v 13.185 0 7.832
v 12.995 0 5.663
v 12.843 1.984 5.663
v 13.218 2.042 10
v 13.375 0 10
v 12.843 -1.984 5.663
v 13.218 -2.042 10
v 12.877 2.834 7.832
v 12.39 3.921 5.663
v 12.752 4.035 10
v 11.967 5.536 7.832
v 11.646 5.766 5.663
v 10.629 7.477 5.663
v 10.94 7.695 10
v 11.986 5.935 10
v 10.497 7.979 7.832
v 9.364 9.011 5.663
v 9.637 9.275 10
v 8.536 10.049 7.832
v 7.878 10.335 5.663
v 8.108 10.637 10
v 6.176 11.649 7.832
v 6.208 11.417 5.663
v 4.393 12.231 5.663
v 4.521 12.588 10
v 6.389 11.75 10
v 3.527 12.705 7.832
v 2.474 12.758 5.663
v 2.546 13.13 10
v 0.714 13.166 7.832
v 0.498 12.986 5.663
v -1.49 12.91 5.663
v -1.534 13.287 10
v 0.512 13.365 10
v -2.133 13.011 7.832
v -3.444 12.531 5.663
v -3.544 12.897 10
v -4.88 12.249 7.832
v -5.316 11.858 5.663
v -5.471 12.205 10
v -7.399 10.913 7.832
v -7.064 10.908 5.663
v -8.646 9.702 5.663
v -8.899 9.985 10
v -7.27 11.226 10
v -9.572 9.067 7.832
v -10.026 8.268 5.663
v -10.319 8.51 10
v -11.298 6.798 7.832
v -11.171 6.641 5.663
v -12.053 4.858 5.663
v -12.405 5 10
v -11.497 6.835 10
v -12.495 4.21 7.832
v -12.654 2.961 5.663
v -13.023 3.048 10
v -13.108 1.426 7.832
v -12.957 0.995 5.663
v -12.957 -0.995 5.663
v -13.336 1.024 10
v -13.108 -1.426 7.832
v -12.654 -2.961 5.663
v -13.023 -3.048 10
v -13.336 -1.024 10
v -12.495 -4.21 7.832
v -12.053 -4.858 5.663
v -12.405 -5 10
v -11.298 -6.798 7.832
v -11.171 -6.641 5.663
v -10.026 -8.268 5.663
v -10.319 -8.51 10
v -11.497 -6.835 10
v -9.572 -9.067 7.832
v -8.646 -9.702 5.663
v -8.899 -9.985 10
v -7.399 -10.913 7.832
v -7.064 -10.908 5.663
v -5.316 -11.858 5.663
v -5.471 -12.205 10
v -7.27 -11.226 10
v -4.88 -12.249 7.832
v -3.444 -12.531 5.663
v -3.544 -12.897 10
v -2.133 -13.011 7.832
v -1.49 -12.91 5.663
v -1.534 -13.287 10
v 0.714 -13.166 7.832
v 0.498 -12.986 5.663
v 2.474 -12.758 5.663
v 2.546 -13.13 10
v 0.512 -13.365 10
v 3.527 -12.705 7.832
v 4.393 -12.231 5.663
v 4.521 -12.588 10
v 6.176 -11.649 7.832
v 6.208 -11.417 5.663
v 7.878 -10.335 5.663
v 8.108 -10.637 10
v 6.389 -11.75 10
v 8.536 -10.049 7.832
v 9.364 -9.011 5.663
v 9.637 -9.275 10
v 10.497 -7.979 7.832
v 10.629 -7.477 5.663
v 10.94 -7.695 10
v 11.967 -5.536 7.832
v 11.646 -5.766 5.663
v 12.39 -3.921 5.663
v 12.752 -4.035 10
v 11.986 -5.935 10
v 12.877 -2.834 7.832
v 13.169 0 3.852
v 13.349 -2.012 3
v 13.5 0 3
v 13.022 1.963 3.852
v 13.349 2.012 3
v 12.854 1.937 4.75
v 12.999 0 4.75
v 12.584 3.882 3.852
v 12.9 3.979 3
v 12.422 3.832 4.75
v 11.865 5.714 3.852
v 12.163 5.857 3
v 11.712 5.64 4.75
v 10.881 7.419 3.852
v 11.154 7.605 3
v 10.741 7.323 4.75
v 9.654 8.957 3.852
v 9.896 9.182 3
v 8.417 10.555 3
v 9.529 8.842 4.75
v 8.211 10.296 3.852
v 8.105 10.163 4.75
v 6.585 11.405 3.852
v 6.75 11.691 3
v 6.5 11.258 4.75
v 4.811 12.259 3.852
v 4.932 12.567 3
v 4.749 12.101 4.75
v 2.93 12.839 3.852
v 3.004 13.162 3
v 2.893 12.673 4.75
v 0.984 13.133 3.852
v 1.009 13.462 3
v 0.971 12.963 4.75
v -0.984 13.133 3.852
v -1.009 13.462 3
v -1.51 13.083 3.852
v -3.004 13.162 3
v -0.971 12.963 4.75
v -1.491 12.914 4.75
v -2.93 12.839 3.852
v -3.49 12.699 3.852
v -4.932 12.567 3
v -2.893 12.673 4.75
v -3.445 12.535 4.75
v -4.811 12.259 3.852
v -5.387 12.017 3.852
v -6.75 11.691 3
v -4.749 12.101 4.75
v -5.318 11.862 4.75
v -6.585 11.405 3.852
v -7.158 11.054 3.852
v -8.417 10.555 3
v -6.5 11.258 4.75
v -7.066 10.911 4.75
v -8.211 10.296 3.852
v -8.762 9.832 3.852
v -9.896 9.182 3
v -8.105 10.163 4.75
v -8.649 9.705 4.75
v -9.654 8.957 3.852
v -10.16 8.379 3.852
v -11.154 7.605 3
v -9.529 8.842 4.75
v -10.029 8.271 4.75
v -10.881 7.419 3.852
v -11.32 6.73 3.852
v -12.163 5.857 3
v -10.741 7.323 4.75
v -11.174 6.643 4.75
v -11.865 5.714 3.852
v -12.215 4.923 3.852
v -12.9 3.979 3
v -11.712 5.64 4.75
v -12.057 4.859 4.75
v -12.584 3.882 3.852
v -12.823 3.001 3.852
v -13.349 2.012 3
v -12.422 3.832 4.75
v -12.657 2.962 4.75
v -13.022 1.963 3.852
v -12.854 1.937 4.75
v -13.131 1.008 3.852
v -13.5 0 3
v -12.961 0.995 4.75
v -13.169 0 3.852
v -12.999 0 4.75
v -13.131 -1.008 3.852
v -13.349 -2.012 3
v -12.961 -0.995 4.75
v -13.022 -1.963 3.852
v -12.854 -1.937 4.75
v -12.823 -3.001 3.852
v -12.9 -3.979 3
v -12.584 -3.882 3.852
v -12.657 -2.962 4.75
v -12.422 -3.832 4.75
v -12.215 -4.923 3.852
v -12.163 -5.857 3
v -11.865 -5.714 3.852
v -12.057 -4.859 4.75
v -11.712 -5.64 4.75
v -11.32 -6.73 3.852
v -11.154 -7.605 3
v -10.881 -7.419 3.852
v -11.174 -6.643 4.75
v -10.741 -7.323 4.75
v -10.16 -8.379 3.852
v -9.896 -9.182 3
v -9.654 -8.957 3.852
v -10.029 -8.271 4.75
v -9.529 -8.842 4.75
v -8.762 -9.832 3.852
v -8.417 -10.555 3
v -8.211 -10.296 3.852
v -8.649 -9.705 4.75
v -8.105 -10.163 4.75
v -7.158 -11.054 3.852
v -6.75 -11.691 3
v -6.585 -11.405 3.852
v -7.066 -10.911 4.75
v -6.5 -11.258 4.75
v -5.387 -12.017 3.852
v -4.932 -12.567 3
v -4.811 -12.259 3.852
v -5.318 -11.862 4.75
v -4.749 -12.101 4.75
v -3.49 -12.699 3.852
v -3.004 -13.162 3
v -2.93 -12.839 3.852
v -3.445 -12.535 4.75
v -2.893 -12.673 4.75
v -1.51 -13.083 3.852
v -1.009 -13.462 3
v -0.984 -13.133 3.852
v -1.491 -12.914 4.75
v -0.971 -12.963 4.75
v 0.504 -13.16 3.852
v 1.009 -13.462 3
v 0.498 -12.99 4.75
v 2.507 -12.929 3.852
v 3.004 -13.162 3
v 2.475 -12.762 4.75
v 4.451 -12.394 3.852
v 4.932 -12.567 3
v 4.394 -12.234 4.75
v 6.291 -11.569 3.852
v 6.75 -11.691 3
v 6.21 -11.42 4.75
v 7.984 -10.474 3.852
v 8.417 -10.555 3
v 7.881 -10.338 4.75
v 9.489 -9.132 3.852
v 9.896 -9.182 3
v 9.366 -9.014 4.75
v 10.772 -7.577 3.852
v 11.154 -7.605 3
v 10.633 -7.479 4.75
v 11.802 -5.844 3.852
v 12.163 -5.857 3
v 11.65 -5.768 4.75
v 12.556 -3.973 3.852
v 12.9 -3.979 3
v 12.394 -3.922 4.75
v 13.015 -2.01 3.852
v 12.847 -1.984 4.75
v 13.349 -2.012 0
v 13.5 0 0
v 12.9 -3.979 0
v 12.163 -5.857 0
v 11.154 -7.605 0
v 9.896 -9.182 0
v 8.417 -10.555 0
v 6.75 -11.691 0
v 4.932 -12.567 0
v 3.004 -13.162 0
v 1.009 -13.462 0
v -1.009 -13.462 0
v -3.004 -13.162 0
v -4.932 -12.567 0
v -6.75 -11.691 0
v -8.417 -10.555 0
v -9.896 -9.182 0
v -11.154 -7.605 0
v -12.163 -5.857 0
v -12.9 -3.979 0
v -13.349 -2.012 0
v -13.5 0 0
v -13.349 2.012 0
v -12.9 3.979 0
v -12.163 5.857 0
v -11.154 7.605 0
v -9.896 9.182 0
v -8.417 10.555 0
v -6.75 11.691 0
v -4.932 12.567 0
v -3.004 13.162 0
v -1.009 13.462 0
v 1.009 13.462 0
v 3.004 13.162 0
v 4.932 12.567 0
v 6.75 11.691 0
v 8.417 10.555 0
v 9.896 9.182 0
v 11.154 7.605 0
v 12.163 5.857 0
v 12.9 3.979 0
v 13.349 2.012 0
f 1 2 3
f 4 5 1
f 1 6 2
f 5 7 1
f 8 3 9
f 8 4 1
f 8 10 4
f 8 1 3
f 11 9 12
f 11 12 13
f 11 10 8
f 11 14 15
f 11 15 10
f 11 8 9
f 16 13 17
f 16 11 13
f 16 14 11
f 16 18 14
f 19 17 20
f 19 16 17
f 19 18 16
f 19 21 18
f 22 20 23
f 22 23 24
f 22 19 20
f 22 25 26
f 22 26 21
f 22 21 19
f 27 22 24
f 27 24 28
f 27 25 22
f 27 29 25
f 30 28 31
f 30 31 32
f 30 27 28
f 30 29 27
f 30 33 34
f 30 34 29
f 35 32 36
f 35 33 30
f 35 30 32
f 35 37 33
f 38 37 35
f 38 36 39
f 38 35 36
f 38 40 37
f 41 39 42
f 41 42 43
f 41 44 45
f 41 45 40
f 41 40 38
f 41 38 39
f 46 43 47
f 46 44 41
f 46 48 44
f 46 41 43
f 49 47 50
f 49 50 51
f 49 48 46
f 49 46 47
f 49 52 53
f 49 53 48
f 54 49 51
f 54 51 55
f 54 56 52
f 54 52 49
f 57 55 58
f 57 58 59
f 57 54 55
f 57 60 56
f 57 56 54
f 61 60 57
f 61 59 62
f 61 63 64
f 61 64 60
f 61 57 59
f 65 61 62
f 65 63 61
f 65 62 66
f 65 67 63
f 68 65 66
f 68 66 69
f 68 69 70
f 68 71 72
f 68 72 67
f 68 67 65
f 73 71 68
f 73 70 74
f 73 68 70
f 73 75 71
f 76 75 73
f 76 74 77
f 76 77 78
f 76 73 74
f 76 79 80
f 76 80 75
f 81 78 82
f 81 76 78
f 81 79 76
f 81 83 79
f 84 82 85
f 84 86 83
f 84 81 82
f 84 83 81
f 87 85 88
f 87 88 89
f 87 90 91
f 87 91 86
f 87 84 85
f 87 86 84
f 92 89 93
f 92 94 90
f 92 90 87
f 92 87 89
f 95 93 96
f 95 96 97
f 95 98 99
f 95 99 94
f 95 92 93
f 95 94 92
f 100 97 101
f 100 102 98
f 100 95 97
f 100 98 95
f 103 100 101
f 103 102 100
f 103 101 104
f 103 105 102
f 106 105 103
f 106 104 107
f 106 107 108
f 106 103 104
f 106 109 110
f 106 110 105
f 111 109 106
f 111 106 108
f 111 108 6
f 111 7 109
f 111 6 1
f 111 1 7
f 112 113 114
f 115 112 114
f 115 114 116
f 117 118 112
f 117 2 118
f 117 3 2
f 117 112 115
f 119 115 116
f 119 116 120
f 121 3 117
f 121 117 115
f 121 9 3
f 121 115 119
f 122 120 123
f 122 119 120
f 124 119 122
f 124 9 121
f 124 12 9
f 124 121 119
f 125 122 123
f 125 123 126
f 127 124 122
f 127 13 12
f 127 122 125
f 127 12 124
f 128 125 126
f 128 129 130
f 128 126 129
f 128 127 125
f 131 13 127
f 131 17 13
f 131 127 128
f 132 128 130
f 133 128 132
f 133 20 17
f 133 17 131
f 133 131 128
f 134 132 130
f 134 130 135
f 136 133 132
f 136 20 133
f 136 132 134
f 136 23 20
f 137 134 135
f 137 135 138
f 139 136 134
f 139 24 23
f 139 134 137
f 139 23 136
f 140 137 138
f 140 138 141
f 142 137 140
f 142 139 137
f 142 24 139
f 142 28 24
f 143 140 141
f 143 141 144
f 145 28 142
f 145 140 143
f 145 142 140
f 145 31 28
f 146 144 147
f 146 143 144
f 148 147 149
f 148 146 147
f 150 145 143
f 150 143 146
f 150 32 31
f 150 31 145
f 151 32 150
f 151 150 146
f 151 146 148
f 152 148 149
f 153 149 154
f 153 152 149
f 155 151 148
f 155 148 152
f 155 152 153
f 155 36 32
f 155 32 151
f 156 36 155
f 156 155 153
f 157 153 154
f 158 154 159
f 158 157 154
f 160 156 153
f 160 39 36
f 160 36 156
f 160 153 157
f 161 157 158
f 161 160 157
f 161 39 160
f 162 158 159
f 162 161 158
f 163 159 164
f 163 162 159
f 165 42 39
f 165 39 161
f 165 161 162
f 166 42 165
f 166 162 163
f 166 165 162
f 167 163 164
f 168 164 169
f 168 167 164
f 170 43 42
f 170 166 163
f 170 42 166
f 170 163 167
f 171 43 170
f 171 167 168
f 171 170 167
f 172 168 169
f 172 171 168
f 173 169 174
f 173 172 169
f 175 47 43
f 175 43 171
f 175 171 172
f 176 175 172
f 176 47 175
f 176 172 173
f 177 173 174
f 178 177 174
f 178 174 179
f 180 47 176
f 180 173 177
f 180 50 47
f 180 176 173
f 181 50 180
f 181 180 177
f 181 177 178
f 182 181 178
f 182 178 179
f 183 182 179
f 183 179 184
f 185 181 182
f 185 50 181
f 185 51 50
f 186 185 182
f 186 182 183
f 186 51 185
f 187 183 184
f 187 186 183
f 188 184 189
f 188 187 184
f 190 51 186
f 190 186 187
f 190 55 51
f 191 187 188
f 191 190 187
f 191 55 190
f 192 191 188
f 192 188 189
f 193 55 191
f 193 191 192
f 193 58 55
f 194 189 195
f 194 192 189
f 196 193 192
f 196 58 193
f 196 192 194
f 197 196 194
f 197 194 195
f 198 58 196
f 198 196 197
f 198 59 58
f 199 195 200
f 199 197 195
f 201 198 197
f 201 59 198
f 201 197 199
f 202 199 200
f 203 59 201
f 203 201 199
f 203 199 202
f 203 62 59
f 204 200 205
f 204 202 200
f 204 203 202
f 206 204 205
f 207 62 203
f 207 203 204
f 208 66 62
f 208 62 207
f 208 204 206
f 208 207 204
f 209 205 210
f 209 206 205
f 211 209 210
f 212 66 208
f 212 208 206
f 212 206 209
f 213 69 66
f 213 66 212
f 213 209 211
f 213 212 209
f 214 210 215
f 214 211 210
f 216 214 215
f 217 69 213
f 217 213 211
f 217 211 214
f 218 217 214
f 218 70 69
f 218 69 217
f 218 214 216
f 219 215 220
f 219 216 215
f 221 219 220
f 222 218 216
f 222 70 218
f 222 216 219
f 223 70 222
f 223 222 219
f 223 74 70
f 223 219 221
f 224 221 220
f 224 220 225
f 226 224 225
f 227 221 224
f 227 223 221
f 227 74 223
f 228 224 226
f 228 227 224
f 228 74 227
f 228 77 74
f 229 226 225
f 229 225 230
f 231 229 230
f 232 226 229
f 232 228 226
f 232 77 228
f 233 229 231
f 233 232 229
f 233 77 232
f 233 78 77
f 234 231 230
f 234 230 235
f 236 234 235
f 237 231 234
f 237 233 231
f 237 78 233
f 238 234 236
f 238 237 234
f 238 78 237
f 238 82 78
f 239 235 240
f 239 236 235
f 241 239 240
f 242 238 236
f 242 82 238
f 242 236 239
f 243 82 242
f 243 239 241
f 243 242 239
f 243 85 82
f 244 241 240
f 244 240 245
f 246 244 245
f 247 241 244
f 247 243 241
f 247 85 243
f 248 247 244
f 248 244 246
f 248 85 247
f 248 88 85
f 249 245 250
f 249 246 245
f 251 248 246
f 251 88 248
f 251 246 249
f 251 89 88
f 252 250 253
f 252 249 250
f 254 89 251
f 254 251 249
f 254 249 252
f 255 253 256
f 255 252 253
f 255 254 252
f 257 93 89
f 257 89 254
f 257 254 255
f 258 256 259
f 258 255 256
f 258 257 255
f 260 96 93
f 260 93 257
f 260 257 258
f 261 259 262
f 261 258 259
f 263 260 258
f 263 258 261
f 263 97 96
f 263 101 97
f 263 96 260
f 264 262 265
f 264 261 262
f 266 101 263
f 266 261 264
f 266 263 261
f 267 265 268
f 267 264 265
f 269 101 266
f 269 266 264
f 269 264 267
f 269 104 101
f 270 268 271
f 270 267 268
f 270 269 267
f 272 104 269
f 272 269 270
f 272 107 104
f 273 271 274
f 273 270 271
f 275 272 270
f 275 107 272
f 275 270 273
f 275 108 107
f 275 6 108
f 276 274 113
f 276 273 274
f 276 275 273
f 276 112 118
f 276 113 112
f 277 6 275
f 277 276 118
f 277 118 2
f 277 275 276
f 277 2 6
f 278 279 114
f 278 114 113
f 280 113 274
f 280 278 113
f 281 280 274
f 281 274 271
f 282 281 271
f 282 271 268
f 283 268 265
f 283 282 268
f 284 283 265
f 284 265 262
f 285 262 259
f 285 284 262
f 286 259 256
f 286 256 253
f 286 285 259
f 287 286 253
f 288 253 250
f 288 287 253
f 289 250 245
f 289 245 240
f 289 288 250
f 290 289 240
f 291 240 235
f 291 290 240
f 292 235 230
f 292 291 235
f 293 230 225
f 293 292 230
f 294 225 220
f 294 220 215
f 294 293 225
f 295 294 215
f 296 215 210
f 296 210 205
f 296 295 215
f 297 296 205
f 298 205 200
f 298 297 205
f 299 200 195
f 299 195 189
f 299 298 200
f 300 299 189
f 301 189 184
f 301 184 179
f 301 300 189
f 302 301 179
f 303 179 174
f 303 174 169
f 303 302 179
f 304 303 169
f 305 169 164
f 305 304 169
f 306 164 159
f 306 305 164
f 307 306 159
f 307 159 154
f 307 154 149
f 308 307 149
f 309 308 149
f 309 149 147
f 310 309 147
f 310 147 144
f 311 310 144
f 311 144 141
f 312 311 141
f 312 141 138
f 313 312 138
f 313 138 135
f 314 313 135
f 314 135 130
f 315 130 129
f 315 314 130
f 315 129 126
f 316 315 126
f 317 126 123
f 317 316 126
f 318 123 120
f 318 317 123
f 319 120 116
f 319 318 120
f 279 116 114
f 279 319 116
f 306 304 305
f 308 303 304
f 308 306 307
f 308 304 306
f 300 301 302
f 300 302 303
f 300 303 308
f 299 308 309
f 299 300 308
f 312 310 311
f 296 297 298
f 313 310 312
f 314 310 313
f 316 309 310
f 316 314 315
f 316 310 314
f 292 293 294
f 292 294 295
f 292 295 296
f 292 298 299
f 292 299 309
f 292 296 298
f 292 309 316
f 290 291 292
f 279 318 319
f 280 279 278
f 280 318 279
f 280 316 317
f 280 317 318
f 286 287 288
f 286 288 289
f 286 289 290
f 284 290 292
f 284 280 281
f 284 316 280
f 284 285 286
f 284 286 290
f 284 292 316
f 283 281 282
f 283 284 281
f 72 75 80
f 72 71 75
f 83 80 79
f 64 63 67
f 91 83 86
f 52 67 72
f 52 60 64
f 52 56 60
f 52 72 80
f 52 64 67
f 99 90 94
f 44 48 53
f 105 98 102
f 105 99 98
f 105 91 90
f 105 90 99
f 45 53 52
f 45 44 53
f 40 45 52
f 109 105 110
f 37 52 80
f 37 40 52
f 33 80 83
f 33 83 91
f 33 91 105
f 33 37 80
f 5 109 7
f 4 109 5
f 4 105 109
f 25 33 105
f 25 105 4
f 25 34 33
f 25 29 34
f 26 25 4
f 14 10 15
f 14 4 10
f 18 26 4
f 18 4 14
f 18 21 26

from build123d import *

# Parameters (mm, degrees)
F0_R     = 12.5
F1_DEPTH = 10
F1_TAPER = -5
F2_R     = 13.5
F3_DEPTH = 3


# Not quite as in the source:
# - a fillet or chamfer that OpenCascade refuses, or shapes differently, is made with other operations: its cross-section is extruded or revolved along the edge and cut away or added


with BuildPart() as f1:
    # F0 (on Top) → F1 (new body)
    with BuildSketch(Plane.XY):
        Circle(F0_R)
    extrude(amount=F1_DEPTH, taper=F1_TAPER)

    # F2 (on face) → F3 (join)
    with BuildSketch(Plane(origin=(0, 0, 0), x_dir=(1, 0, 0), z_dir=(0, 0, -1))):
        Circle(F2_R)
    extrude(amount=-F3_DEPTH)

    # F4: fillet of radius 5 on 1 edges, made by hand

    # F4_s1 → F4_t2 (revolve)
    with BuildSketch(Plane.XZ):
        with BuildLine():
            ThreePointArc((13.5, 3), (13.0638190953, 4.2967665116), (12.9954672306, 5.6632163606))
            Line((12.9954672306, 5.6632163606), (12.8958477608, 5.6719319348))
            Line((12.8958477608, 5.6719319348), (12.6628465208, 3.0087155743))
            Line((12.6628465208, 3.0087155743), (12.7624659906, 2.9))
            ThreePointArc((12.7624659906, 2.9), (13.1312329953, 2.9), (13.4104711856, 2.9554512471))
            Line((13.4104711856, 2.9554512471), (13.5, 3))
        make_face()
    revolve(axis=Axis((0, 0, 3), (0, 0, 1)))


solid = f1.part
